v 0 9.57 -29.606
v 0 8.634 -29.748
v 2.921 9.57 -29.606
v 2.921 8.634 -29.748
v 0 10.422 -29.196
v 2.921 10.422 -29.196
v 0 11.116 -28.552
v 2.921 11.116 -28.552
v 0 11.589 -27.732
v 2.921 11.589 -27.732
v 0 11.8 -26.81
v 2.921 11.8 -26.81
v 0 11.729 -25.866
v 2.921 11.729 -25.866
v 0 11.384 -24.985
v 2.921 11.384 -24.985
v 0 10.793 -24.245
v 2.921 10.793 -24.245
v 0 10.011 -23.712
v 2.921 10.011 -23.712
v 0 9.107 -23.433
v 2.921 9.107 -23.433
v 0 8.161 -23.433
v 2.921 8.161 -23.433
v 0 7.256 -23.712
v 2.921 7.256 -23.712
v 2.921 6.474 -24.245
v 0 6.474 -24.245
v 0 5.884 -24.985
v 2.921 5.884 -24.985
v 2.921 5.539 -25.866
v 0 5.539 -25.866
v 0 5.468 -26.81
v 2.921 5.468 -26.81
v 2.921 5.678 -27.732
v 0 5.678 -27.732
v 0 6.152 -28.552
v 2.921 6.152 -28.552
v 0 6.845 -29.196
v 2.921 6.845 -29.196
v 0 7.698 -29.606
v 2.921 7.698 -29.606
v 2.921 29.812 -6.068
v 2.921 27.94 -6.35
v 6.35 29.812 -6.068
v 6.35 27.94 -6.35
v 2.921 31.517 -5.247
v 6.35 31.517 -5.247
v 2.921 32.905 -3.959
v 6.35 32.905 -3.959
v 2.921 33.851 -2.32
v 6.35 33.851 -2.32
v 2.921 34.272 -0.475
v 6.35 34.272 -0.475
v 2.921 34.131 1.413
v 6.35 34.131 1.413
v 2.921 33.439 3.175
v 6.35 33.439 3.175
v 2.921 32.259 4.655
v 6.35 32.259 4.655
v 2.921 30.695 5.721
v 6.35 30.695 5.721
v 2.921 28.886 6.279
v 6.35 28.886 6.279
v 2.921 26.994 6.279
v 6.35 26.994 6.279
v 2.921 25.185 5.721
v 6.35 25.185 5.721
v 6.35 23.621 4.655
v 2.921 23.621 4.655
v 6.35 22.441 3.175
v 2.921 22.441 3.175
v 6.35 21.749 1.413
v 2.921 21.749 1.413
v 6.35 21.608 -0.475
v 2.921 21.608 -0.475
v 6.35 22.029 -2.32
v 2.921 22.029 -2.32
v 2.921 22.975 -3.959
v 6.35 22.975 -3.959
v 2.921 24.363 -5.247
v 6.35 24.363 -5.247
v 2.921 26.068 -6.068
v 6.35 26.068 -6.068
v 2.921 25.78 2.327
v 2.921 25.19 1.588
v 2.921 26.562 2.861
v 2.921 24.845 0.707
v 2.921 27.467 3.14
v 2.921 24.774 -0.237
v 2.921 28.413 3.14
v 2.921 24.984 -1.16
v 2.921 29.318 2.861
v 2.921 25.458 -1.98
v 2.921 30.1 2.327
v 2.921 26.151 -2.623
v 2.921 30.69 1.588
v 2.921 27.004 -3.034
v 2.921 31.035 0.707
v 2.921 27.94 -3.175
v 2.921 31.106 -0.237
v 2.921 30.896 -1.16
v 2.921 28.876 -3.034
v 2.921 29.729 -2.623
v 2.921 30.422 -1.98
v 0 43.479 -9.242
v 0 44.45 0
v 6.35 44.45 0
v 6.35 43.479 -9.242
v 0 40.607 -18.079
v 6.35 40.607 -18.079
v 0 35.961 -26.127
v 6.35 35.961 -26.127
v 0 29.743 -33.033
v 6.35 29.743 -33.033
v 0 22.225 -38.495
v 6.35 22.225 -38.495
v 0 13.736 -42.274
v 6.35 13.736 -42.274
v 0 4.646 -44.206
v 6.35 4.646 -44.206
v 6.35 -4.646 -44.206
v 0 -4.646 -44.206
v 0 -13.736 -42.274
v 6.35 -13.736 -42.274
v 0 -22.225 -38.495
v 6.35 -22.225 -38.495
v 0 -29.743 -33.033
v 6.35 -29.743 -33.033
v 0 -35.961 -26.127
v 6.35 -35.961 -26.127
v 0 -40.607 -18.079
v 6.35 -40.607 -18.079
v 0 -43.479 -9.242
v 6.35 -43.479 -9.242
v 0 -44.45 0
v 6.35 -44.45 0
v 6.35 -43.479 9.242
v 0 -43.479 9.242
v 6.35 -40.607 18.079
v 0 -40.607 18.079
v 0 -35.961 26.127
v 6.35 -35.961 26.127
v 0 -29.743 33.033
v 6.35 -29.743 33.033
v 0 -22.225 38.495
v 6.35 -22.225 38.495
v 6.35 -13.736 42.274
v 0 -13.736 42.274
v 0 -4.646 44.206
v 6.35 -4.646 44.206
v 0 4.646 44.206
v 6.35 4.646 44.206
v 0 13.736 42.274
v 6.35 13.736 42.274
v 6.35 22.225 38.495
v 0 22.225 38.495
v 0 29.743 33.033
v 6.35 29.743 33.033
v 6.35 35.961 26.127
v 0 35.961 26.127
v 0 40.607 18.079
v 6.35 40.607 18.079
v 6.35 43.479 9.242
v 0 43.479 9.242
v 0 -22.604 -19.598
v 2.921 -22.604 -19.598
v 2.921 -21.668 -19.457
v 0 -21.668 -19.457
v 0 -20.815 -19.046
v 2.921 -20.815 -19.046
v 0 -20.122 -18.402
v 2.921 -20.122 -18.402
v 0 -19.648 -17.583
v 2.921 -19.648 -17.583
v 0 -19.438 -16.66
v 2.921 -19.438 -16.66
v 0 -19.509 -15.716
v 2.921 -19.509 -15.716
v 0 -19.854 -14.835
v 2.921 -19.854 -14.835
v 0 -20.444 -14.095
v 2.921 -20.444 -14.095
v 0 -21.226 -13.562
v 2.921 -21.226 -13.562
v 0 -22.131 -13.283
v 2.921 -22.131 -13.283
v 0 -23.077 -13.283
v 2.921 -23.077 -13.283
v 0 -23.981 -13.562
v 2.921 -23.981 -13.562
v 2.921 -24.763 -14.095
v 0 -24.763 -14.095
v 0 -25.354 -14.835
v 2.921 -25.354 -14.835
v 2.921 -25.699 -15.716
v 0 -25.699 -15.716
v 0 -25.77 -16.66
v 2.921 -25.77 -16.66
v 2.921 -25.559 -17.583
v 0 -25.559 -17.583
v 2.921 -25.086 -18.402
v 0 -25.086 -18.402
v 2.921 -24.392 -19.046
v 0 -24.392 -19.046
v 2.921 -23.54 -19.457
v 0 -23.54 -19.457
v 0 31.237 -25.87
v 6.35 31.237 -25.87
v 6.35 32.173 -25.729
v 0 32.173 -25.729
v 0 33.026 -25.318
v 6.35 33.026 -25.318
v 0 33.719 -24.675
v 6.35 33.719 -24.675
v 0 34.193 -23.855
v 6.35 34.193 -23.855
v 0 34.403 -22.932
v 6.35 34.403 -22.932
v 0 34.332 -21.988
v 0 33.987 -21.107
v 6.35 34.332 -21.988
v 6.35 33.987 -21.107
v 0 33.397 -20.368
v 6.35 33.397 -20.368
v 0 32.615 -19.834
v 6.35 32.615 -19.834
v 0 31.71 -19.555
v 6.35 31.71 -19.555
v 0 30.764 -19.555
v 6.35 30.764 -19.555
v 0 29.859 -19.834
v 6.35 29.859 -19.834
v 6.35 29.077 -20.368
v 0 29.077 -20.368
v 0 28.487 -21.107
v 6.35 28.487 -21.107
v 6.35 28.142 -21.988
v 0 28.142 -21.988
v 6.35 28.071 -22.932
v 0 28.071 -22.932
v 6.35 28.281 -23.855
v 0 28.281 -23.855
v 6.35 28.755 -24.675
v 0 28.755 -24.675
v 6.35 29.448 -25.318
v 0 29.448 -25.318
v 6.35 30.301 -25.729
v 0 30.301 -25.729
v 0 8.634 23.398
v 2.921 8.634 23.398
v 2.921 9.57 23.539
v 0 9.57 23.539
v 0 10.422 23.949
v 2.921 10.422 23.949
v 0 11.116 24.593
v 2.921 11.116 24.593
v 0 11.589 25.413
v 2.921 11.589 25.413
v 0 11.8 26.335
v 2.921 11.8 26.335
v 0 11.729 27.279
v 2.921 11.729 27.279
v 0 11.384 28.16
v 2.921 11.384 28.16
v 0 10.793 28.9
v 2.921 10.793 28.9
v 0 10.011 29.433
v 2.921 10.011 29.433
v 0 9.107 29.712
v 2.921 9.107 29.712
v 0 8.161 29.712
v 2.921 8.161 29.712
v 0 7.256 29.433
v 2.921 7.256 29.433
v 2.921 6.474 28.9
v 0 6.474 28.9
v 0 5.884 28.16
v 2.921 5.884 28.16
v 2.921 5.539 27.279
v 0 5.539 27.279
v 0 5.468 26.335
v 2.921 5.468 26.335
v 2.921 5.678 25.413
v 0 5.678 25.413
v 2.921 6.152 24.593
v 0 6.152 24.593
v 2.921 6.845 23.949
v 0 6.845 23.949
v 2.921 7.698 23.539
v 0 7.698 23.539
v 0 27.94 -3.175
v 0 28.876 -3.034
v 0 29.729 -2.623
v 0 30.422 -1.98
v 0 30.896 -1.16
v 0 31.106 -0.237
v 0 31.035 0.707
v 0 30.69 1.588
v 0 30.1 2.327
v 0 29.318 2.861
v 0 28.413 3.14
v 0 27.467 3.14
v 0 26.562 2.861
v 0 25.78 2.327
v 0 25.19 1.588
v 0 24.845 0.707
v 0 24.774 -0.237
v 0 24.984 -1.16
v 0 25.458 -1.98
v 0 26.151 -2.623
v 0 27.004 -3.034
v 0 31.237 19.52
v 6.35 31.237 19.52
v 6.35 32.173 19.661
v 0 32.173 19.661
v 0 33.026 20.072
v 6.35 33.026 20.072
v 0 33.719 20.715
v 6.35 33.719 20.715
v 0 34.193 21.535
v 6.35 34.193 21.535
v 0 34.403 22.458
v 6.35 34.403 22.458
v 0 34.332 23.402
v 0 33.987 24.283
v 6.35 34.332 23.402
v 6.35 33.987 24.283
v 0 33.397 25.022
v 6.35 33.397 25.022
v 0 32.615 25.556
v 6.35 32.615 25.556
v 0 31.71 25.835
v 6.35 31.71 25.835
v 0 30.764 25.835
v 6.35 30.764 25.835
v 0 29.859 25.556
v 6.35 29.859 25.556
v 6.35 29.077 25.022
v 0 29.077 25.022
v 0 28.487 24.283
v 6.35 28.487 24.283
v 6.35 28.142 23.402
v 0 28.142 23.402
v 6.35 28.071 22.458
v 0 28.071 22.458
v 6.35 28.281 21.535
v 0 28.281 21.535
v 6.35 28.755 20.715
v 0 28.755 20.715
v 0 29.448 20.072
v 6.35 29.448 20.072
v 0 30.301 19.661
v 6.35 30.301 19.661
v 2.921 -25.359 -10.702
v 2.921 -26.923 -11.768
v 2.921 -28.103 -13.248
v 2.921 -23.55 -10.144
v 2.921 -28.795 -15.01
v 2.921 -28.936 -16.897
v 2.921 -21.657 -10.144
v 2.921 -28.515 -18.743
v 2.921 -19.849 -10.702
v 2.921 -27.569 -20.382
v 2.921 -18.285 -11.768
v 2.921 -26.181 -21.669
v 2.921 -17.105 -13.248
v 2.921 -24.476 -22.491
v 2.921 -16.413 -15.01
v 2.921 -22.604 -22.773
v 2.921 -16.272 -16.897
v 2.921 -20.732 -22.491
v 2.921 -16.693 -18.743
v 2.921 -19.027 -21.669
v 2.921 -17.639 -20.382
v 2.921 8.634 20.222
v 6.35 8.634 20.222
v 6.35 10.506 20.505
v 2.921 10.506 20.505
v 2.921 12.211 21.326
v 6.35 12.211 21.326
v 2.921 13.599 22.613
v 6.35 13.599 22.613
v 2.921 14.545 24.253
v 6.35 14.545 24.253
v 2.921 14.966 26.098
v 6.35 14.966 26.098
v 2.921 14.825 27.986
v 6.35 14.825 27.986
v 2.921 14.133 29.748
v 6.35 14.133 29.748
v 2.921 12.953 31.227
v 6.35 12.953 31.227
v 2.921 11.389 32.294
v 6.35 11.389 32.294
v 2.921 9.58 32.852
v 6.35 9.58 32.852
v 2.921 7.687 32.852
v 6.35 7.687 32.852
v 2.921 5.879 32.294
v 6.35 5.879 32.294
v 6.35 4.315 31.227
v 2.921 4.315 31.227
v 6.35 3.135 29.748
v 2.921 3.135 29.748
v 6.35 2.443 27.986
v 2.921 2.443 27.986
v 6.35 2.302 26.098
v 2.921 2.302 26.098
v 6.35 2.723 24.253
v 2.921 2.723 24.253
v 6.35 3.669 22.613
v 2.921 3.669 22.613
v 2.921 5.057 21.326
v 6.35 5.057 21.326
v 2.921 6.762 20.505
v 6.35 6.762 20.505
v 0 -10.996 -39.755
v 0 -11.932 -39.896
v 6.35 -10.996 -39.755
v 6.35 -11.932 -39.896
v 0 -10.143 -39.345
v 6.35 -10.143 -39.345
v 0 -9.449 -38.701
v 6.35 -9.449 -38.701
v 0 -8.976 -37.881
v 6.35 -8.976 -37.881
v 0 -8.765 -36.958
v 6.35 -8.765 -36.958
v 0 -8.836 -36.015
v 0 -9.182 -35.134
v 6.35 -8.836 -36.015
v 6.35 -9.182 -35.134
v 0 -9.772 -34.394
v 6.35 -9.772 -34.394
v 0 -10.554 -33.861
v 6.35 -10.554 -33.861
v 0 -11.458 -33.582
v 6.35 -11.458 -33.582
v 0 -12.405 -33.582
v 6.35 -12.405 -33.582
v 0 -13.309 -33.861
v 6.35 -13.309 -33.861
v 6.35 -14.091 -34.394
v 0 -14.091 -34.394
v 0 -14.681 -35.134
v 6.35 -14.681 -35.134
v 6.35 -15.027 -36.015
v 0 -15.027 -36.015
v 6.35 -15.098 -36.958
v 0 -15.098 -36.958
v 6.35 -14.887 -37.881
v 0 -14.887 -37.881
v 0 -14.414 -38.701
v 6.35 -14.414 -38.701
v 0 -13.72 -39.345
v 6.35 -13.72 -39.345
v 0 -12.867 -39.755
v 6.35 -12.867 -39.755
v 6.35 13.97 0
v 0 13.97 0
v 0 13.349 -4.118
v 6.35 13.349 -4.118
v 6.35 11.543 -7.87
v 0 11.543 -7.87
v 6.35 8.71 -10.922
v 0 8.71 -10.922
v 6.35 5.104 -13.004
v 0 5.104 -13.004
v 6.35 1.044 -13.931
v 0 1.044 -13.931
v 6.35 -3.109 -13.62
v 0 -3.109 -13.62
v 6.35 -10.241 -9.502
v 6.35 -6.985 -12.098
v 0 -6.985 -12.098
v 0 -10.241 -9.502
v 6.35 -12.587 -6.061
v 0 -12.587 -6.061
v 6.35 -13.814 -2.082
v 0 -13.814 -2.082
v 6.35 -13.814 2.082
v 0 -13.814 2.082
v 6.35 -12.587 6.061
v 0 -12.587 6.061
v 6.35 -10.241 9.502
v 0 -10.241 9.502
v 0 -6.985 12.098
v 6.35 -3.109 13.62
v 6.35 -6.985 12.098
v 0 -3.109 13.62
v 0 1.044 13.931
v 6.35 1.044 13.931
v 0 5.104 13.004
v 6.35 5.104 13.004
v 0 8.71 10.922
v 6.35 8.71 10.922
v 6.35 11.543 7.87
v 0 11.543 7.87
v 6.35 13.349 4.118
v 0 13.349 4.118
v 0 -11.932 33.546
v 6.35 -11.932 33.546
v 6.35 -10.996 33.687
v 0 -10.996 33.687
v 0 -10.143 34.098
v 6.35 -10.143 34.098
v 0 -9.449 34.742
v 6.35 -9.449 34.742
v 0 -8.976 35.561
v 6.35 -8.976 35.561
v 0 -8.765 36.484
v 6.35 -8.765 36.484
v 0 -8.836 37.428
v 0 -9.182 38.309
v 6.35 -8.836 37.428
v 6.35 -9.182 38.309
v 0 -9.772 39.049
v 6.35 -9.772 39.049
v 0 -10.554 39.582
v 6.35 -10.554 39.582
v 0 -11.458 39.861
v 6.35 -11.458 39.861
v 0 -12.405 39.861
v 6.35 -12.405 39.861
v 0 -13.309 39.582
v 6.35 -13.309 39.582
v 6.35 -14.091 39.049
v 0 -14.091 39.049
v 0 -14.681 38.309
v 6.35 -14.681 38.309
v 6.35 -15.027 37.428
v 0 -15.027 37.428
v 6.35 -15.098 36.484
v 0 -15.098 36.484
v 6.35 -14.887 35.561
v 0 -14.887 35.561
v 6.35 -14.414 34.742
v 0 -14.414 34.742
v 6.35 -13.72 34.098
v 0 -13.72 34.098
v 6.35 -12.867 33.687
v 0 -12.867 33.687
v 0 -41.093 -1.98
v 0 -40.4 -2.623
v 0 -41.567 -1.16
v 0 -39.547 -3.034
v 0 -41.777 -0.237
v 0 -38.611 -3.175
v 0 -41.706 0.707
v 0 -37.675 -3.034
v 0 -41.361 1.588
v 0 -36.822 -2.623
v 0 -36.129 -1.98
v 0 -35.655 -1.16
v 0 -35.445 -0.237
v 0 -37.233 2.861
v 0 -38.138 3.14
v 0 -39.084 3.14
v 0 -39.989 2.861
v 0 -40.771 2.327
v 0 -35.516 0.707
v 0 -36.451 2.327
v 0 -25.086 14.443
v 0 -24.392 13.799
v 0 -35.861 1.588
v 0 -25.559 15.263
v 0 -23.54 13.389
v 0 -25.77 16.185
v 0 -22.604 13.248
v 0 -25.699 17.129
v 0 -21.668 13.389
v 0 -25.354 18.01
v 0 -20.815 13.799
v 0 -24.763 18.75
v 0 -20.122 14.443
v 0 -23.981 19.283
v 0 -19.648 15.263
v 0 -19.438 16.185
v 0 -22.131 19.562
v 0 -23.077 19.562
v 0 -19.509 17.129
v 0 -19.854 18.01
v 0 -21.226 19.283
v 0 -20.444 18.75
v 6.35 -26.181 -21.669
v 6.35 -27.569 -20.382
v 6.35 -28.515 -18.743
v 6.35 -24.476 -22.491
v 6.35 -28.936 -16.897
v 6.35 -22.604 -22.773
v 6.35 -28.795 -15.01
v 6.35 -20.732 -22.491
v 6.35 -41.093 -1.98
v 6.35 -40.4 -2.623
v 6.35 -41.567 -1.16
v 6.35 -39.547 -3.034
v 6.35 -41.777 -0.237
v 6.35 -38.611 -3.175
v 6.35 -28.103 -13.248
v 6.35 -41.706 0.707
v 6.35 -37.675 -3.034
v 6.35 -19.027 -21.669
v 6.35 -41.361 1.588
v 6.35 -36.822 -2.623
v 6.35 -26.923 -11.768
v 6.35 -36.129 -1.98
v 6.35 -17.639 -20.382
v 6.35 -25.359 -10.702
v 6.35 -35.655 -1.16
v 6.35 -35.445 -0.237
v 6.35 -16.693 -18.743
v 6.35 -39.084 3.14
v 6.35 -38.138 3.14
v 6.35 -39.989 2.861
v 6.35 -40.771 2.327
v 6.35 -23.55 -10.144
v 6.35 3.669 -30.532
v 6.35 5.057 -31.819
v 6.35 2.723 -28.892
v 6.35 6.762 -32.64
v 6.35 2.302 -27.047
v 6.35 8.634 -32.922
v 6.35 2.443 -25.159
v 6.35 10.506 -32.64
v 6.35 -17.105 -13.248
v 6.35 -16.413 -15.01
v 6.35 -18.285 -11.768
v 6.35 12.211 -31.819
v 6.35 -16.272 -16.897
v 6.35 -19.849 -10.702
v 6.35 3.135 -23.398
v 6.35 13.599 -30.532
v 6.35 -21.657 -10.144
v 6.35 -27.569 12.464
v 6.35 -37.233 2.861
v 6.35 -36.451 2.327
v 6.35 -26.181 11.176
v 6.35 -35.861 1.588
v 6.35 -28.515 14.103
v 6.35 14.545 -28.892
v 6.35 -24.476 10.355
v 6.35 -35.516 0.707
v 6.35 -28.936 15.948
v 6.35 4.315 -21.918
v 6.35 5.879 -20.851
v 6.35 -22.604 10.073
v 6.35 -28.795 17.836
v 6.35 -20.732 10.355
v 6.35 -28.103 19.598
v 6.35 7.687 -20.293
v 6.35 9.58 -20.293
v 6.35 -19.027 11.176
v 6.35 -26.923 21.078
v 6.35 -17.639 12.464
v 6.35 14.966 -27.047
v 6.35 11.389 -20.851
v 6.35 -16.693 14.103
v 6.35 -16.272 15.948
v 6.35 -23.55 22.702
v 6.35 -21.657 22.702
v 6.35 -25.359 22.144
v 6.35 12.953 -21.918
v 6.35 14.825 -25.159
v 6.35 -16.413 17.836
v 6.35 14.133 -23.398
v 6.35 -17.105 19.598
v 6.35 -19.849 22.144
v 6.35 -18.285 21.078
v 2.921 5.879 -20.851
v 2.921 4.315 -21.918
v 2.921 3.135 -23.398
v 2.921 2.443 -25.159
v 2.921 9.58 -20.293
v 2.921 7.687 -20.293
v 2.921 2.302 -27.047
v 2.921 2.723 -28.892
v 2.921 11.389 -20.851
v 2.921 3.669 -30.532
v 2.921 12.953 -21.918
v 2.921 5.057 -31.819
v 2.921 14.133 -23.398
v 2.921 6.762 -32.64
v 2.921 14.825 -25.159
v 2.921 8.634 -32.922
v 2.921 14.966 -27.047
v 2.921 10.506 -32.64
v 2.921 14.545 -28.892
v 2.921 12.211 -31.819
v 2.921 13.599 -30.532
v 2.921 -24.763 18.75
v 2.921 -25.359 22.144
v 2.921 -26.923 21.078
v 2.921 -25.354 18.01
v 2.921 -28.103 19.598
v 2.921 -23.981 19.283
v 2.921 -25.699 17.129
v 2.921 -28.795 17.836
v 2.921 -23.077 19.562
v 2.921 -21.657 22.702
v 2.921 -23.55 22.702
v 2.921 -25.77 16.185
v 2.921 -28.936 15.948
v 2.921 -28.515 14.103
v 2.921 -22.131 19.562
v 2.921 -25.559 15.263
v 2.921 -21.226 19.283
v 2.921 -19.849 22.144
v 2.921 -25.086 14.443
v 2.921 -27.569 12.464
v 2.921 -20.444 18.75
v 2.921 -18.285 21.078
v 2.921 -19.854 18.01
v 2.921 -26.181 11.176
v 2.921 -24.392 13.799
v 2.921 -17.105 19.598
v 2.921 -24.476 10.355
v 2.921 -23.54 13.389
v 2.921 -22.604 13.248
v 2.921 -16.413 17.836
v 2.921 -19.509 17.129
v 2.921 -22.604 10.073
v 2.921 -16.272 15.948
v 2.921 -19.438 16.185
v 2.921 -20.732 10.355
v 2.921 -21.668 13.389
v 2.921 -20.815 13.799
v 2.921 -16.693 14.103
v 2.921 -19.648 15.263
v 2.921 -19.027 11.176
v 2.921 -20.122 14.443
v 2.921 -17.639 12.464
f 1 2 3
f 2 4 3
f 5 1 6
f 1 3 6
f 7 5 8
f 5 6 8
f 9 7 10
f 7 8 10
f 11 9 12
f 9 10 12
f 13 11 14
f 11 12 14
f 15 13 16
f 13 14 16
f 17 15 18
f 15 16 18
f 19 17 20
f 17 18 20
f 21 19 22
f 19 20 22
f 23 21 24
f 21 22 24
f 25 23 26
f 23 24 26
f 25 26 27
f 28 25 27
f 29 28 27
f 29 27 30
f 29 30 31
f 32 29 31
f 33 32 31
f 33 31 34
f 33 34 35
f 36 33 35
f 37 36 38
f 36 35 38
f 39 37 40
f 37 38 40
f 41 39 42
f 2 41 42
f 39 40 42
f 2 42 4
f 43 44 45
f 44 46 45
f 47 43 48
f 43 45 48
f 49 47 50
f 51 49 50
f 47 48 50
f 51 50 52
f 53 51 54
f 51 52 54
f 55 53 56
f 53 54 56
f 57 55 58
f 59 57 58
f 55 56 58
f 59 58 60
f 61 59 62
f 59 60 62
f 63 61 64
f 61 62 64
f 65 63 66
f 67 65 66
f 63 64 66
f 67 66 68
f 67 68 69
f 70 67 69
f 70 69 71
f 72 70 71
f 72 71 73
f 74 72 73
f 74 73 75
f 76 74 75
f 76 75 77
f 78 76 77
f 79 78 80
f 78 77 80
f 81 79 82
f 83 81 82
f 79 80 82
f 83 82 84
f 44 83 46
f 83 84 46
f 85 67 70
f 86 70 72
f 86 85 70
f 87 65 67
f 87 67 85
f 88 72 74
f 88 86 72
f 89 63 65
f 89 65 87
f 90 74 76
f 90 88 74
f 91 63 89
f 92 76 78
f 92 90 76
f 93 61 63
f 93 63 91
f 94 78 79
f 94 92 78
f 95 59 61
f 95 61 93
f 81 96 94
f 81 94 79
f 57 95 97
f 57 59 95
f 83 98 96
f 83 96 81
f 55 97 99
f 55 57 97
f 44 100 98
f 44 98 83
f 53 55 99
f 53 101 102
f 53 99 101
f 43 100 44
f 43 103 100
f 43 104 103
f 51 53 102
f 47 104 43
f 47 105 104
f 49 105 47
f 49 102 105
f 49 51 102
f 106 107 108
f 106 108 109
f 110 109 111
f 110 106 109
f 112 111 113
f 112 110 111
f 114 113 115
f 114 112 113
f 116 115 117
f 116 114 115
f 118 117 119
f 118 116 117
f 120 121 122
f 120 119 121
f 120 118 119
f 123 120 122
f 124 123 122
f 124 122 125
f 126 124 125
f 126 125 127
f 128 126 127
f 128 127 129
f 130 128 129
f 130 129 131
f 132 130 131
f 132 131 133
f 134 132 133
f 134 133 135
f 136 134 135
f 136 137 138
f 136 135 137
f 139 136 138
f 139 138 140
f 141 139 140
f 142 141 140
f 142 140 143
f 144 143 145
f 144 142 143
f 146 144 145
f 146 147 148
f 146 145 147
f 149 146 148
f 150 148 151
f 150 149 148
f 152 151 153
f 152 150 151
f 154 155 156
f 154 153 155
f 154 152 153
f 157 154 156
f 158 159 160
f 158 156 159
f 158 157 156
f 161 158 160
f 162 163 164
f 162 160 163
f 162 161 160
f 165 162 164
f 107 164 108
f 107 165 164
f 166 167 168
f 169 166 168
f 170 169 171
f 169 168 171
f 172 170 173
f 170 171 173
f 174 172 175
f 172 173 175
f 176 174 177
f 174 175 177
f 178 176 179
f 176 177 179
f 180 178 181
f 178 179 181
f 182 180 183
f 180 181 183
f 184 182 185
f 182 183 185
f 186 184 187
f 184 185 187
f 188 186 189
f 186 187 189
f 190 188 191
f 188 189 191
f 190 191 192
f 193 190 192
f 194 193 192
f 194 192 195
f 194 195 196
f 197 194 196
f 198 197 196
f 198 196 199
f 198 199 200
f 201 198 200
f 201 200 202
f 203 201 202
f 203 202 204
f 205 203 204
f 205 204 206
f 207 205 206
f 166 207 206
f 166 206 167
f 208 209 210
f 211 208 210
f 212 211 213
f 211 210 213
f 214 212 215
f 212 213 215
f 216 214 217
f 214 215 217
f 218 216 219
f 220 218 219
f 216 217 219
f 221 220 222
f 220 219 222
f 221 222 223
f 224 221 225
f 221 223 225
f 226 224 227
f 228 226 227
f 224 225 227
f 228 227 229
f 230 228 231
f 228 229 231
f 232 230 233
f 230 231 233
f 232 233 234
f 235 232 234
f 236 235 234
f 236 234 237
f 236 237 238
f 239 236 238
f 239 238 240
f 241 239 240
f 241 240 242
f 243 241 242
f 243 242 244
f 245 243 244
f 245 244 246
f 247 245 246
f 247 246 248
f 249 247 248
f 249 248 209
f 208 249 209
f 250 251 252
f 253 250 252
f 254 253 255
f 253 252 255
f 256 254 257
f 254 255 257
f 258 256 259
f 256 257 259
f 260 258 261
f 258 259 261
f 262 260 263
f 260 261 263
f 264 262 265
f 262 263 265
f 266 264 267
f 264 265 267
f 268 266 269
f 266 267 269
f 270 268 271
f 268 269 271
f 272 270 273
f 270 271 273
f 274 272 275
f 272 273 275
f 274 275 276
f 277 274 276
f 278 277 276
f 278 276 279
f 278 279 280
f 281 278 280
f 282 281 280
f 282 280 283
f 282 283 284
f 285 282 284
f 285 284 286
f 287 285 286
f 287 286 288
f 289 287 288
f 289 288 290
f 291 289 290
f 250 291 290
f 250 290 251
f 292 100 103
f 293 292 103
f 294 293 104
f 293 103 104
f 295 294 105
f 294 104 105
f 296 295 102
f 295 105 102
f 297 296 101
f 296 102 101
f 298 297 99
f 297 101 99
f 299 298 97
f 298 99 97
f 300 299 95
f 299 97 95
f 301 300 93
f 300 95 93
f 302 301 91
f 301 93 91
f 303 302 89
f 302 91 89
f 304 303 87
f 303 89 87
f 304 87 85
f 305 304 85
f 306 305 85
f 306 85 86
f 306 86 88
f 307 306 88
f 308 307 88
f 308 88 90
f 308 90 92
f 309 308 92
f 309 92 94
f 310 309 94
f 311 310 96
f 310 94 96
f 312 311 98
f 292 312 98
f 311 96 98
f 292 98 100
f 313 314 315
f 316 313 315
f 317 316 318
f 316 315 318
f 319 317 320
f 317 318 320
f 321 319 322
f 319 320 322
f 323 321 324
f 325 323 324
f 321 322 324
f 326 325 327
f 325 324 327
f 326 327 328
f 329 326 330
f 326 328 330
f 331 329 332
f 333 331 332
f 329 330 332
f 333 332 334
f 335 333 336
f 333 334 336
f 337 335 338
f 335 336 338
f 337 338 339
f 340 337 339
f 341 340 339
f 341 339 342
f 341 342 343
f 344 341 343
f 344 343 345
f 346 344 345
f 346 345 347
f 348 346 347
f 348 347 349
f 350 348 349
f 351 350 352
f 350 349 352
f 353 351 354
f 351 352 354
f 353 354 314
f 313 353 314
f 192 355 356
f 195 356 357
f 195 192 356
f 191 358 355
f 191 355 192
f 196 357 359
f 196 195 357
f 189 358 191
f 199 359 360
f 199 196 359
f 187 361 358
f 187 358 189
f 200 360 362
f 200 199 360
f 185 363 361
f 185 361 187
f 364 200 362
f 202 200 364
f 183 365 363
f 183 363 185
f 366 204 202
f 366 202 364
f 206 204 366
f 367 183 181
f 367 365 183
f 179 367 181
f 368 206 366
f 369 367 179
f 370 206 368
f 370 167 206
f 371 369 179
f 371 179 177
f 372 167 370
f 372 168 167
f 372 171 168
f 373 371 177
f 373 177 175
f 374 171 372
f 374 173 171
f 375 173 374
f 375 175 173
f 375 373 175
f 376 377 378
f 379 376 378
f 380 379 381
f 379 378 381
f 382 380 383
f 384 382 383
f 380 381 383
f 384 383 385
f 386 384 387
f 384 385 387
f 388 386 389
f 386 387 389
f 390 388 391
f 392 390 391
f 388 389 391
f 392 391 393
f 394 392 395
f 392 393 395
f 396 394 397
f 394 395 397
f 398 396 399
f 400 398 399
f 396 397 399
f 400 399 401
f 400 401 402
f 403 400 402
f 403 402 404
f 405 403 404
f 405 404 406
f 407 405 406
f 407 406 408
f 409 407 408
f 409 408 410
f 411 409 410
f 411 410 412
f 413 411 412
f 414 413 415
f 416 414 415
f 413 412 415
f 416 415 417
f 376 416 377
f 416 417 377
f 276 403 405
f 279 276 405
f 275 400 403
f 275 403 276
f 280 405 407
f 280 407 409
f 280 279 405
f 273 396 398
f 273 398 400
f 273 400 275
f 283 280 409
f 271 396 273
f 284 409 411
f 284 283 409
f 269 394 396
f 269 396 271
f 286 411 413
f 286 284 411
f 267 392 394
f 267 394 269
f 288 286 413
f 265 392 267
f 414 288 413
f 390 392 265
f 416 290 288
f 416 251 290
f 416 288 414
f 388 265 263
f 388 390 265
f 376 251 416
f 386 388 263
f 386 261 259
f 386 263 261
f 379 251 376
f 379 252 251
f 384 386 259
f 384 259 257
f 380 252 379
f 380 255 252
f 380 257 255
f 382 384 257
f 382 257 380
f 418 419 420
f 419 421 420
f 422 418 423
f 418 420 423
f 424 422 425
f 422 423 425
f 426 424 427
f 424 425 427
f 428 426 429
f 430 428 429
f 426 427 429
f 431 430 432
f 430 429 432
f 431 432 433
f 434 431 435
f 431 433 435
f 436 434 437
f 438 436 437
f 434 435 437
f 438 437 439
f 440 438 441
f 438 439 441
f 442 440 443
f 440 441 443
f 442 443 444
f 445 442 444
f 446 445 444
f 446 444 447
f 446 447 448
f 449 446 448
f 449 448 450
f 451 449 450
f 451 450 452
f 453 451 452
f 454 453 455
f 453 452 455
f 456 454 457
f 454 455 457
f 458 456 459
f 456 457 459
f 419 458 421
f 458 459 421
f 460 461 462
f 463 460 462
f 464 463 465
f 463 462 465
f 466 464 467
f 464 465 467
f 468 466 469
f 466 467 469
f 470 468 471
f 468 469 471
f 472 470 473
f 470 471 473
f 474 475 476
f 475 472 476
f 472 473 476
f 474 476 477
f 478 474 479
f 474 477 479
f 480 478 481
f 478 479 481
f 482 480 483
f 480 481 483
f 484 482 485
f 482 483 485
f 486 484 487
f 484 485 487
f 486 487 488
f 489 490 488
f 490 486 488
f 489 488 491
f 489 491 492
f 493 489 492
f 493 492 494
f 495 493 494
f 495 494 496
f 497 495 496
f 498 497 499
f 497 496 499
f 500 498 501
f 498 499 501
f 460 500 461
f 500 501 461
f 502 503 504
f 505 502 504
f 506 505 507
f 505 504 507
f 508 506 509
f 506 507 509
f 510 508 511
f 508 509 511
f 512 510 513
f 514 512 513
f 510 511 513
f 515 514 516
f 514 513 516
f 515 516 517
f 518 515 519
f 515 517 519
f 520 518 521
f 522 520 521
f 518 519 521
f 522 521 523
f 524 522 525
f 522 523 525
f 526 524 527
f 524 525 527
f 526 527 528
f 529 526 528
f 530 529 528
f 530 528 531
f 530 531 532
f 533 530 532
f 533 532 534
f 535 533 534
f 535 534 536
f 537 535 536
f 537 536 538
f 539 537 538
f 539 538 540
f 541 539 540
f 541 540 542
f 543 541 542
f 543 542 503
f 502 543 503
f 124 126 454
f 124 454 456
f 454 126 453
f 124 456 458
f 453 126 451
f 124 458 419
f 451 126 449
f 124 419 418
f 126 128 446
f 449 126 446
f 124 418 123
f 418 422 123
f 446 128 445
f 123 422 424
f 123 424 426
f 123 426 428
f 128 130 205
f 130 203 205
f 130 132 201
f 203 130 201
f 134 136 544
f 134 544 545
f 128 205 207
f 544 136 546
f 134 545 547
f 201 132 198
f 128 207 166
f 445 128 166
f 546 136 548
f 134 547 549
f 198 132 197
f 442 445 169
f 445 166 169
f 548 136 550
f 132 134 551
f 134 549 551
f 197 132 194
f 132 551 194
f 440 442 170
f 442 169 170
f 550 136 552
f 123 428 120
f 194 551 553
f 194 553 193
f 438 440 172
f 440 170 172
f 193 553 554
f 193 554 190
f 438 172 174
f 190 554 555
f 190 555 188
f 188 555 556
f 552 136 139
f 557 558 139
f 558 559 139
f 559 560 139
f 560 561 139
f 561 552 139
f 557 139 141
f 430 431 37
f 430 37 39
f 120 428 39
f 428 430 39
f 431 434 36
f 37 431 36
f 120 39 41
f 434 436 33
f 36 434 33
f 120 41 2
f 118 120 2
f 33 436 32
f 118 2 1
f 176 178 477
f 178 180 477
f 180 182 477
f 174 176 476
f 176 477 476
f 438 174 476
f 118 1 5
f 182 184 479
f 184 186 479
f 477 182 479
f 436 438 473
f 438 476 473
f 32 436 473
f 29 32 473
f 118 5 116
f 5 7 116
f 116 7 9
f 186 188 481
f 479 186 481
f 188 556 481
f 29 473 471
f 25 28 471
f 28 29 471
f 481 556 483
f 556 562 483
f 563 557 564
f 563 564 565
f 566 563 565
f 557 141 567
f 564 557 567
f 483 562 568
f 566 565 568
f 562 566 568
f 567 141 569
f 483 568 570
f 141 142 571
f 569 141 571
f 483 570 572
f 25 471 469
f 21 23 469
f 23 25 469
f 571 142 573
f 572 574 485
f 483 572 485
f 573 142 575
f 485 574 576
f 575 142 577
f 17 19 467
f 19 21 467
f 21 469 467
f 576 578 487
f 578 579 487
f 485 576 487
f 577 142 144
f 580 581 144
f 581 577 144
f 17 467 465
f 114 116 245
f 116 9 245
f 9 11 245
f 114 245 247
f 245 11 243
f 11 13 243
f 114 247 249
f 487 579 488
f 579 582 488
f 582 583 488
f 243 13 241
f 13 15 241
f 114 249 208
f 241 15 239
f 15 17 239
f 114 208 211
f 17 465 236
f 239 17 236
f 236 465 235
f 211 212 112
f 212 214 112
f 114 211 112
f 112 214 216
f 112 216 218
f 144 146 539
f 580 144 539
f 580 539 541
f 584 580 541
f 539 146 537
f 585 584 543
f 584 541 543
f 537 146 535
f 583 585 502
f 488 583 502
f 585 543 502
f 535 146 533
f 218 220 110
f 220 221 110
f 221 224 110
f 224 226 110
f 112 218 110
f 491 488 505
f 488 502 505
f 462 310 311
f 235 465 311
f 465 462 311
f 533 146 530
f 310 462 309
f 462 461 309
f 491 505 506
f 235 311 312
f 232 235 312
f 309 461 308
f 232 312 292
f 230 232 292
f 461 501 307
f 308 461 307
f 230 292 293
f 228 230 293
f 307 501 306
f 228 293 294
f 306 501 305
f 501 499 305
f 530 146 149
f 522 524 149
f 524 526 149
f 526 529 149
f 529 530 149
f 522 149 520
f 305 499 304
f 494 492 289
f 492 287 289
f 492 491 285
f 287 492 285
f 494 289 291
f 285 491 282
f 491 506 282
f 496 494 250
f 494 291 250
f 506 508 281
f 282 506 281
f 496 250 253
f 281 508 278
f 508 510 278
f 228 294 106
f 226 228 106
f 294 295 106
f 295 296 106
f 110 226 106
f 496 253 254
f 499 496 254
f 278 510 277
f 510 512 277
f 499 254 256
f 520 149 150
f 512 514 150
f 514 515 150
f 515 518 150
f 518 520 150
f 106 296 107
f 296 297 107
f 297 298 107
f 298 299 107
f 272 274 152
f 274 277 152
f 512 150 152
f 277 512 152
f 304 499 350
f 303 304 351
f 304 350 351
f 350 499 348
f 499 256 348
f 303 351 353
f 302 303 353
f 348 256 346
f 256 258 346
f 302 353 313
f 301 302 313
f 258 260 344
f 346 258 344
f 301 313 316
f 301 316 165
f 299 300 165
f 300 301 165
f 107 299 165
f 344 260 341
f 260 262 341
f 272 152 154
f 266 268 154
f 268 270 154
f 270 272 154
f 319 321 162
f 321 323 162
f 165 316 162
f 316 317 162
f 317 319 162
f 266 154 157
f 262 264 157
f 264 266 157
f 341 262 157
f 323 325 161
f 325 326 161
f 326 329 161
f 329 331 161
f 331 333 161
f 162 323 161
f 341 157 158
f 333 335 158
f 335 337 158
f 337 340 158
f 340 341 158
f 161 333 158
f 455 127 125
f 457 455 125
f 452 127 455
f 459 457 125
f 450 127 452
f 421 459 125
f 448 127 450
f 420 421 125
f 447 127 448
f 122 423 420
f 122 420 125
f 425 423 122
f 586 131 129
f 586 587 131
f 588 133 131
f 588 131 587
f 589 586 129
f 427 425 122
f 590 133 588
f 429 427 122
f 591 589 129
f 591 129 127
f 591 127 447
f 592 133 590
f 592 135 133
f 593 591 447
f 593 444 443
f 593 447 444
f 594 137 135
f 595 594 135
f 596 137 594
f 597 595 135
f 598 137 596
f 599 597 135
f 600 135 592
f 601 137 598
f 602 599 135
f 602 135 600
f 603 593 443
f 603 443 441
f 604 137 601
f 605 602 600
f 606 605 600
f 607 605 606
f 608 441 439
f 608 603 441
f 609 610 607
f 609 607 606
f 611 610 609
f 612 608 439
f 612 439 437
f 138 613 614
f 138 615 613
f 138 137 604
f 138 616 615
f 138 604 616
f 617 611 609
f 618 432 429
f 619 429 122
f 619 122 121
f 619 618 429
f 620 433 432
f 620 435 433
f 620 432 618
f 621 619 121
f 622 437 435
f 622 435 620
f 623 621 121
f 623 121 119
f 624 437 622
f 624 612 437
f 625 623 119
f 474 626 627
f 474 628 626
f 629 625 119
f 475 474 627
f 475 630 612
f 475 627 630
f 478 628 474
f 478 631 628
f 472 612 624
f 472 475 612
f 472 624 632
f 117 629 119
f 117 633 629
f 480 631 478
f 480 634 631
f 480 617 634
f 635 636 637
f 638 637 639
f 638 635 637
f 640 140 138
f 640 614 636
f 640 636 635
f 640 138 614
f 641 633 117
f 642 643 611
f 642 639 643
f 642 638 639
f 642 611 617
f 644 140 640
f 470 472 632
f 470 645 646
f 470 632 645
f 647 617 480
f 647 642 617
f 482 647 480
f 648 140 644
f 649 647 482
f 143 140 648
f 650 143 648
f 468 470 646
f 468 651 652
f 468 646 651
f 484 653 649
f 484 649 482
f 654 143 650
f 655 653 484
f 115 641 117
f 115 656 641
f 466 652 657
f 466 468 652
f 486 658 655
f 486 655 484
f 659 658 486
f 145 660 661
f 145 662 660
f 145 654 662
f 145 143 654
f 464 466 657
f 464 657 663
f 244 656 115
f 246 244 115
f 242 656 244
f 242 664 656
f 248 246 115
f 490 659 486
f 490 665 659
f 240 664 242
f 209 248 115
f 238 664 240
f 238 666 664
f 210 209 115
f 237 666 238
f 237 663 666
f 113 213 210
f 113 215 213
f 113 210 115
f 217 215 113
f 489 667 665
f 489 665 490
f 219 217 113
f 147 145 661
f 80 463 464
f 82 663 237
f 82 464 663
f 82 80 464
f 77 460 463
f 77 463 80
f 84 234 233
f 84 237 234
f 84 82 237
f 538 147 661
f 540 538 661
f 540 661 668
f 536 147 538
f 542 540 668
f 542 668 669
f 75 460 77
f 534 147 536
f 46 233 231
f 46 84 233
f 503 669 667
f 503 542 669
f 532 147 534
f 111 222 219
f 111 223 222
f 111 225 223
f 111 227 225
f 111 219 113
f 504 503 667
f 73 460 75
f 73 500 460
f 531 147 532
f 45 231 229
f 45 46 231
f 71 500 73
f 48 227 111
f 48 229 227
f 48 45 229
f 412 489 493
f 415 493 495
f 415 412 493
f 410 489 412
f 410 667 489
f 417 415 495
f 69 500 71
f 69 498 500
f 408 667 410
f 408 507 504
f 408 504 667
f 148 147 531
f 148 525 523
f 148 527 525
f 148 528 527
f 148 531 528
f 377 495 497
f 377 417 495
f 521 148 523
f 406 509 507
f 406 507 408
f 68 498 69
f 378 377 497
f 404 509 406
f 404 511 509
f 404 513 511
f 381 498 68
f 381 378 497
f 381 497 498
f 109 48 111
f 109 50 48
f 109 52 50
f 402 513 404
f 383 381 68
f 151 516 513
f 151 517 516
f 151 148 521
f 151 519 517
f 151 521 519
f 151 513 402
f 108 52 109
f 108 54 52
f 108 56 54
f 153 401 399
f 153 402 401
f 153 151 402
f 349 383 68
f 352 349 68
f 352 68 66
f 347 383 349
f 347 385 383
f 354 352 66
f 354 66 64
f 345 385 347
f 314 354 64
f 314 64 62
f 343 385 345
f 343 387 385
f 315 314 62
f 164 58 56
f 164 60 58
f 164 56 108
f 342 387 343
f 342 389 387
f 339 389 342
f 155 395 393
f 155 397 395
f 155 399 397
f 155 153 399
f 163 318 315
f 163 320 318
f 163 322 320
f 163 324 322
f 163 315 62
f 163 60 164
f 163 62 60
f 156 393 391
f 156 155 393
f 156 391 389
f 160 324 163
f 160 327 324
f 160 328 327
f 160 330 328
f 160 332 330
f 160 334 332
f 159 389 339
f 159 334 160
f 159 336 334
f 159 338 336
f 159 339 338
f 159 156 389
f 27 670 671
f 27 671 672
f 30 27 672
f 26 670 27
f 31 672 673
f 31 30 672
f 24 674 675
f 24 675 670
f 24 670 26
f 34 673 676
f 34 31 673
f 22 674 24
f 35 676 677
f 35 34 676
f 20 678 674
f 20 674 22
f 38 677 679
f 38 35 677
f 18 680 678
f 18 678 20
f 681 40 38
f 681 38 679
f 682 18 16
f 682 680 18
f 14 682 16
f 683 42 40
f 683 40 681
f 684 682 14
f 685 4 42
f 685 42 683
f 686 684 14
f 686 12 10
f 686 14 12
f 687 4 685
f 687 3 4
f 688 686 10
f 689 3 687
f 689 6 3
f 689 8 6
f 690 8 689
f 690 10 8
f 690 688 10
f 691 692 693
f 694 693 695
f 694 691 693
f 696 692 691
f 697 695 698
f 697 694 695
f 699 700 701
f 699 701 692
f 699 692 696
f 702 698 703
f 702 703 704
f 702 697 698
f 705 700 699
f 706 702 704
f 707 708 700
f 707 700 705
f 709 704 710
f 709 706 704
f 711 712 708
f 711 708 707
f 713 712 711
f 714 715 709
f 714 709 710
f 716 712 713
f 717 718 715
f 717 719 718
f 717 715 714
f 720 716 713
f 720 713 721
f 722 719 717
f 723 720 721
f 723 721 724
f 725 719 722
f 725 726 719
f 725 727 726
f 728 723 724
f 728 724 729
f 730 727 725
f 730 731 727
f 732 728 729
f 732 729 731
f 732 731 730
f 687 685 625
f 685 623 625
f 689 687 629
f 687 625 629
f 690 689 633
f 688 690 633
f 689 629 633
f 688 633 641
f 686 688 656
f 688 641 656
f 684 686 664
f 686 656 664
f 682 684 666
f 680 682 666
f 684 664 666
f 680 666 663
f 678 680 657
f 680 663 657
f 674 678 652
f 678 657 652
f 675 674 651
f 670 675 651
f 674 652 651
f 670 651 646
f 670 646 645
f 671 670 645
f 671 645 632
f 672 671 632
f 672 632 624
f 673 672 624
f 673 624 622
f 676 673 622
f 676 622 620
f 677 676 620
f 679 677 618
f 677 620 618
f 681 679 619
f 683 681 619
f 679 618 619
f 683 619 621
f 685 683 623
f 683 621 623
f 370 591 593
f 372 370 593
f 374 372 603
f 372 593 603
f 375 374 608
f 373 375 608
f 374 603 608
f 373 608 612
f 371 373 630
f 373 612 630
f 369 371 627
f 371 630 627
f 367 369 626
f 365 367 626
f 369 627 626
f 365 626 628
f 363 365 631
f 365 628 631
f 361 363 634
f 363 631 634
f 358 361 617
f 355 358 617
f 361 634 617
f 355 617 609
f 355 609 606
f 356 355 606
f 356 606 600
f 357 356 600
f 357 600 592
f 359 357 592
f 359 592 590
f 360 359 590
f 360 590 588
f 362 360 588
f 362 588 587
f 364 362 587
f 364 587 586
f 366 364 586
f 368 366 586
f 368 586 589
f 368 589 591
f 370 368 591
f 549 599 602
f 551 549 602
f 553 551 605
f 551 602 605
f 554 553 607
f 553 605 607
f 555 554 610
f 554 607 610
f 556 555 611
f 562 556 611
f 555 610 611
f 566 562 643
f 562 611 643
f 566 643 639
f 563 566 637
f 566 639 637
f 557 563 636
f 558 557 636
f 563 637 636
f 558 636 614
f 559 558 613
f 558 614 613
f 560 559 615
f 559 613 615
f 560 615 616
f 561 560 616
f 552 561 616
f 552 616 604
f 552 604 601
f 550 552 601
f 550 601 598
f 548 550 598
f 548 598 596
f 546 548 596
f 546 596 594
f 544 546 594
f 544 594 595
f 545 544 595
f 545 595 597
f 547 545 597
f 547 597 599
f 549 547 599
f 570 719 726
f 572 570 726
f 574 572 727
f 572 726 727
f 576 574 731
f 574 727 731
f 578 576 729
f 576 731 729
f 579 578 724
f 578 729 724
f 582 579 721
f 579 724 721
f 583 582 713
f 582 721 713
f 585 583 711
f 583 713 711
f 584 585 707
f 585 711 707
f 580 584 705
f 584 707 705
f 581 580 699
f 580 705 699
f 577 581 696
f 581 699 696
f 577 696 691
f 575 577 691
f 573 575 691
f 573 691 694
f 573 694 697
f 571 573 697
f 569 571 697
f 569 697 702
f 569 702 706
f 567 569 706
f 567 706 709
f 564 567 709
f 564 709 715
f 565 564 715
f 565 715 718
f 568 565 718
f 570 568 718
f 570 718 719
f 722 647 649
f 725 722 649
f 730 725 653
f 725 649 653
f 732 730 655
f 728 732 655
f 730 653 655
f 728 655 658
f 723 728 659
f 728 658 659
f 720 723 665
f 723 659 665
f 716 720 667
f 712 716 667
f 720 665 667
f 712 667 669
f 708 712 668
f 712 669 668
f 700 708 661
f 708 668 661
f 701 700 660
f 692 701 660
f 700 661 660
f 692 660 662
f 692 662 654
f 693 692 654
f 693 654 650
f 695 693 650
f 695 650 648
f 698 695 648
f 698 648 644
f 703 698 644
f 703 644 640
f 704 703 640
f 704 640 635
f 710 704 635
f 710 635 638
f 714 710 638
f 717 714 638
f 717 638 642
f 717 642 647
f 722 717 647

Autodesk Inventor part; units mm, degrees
ref_plane "YZ Plane" through (0, 0, 0) normal (1, 0, 0) x (0, 1, 0)
ref_plane "XZ Plane" through (0, 0, 0) normal (0, 1, 0) x (-1, 0, 0)
ref_plane "XY Plane" through (0, 0, 0) normal (0, 0, 1) x (1, 0, 0)
sketch "Sketch1" plane through (0, 0, 0) normal (1, 0, 0) x (0, 1, 0)
  circle A0 centre (0, 0) radius 13.97
  circle A1 centre (0, 0) radius 44.45
  dimension "d0" = 27.94
  dimension "d1" = 88.9
extrude "Extrusion1" add sketch "Sketch1" along normal blind 6.35
sketch "Sketch2" plane through (6.35, 0, 0) normal (1, 0, 0) x (0, 0, -1)
  arc A0 (25.458, -0.8256) -> (35.4837, 5.2699) centre (26.5725, 8.6339) ccw projected
  arc A1 (25.6093, -25.1202) -> (21.0812, -14.2959) centre (16.4227, -22.6039) ccw projected
  arc A2 (37.0087, -36.5562) -> (51.4278, 7.8214) centre (0, 0) ccw projected
  circle A3 centre (36.7212, -11.9315) radius 13.4082
  circle A4 centre (36.7212, -11.9315) radius 3.175
  circle A5 centre (22.695, 31.237) radius 3.175
  circle A6 centre (-22.695, 31.237) radius 3.175
  circle A7 centre (-36.7212, -11.9315) radius 3.175
  circle A8 centre (0, -38.611) radius 3.175
  point P0 (0, 0)
  dimension "d4" = 6.35
  dimension "d7" = 360
extrude "Extrusion2" cut sketch "Sketch2" against normal through all contours A4 | A5 | A6 | A7 | A8
thread "Thread1" size "1/4-20 UNC" class "2B" standard "ANSI Unified Screw Threads" full length
thread "Thread2" size "1/4-20 UNC" class "2B" standard "ANSI Unified Screw Threads" full length
thread "Thread3" size "1/4-20 UNC" class "2B" standard "ANSI Unified Screw Threads" full length
thread "Thread4" size "1/4-20 UNC" class "2B" standard "ANSI Unified Screw Threads" full length
thread "Thread5" size "1/4-20 UNC" class "2B" standard "ANSI Unified Screw Threads" full length
sketch "Sketch3" plane through (6.35, 0, 0) normal (1, 0, 0) x (0, 0, -1)
  circle A0 centre (26.5725, 8.6339) radius 1.27 projected
  circle A1 centre (26.5725, 8.6339) radius 3.175
  circle A2 centre (0, 27.94) radius 3.175
  circle A3 centre (-26.5725, 8.6339) radius 3.175
  circle A4 centre (-16.4227, -22.6039) radius 3.175
  circle A5 centre (16.4227, -22.6039) radius 3.175
  point P0 (0, 0)
  dimension "d21" = 6.35
  dimension "d24" = 360
extrude "Extrusion3" cut sketch "Sketch3" against normal up to next contours A0 | A1 | A2 | A3 | A4 | A5
sketch "Sketch4" plane through (6.35, 0, 0) normal (1, 0, 0) x (0, 0, -1)
  circle A0 centre (26.5725, 8.6339) radius 3.175 projected
  circle A1 centre (26.5725, 8.6339) radius 6.35
  circle A2 centre (0, 27.94) radius 6.35
  circle A3 centre (-26.5725, 8.6339) radius 6.35
  circle A4 centre (-16.4227, -22.6039) radius 6.35
  circle A5 centre (16.4227, -22.6039) radius 6.35
  point P0 (0, 0)
  dimension "d28" = 12.7
  dimension "d33" = 360
extrude "Extrusion4" cut sketch "Sketch4" against normal blind 3.429
properties part number "spacer_flange"
